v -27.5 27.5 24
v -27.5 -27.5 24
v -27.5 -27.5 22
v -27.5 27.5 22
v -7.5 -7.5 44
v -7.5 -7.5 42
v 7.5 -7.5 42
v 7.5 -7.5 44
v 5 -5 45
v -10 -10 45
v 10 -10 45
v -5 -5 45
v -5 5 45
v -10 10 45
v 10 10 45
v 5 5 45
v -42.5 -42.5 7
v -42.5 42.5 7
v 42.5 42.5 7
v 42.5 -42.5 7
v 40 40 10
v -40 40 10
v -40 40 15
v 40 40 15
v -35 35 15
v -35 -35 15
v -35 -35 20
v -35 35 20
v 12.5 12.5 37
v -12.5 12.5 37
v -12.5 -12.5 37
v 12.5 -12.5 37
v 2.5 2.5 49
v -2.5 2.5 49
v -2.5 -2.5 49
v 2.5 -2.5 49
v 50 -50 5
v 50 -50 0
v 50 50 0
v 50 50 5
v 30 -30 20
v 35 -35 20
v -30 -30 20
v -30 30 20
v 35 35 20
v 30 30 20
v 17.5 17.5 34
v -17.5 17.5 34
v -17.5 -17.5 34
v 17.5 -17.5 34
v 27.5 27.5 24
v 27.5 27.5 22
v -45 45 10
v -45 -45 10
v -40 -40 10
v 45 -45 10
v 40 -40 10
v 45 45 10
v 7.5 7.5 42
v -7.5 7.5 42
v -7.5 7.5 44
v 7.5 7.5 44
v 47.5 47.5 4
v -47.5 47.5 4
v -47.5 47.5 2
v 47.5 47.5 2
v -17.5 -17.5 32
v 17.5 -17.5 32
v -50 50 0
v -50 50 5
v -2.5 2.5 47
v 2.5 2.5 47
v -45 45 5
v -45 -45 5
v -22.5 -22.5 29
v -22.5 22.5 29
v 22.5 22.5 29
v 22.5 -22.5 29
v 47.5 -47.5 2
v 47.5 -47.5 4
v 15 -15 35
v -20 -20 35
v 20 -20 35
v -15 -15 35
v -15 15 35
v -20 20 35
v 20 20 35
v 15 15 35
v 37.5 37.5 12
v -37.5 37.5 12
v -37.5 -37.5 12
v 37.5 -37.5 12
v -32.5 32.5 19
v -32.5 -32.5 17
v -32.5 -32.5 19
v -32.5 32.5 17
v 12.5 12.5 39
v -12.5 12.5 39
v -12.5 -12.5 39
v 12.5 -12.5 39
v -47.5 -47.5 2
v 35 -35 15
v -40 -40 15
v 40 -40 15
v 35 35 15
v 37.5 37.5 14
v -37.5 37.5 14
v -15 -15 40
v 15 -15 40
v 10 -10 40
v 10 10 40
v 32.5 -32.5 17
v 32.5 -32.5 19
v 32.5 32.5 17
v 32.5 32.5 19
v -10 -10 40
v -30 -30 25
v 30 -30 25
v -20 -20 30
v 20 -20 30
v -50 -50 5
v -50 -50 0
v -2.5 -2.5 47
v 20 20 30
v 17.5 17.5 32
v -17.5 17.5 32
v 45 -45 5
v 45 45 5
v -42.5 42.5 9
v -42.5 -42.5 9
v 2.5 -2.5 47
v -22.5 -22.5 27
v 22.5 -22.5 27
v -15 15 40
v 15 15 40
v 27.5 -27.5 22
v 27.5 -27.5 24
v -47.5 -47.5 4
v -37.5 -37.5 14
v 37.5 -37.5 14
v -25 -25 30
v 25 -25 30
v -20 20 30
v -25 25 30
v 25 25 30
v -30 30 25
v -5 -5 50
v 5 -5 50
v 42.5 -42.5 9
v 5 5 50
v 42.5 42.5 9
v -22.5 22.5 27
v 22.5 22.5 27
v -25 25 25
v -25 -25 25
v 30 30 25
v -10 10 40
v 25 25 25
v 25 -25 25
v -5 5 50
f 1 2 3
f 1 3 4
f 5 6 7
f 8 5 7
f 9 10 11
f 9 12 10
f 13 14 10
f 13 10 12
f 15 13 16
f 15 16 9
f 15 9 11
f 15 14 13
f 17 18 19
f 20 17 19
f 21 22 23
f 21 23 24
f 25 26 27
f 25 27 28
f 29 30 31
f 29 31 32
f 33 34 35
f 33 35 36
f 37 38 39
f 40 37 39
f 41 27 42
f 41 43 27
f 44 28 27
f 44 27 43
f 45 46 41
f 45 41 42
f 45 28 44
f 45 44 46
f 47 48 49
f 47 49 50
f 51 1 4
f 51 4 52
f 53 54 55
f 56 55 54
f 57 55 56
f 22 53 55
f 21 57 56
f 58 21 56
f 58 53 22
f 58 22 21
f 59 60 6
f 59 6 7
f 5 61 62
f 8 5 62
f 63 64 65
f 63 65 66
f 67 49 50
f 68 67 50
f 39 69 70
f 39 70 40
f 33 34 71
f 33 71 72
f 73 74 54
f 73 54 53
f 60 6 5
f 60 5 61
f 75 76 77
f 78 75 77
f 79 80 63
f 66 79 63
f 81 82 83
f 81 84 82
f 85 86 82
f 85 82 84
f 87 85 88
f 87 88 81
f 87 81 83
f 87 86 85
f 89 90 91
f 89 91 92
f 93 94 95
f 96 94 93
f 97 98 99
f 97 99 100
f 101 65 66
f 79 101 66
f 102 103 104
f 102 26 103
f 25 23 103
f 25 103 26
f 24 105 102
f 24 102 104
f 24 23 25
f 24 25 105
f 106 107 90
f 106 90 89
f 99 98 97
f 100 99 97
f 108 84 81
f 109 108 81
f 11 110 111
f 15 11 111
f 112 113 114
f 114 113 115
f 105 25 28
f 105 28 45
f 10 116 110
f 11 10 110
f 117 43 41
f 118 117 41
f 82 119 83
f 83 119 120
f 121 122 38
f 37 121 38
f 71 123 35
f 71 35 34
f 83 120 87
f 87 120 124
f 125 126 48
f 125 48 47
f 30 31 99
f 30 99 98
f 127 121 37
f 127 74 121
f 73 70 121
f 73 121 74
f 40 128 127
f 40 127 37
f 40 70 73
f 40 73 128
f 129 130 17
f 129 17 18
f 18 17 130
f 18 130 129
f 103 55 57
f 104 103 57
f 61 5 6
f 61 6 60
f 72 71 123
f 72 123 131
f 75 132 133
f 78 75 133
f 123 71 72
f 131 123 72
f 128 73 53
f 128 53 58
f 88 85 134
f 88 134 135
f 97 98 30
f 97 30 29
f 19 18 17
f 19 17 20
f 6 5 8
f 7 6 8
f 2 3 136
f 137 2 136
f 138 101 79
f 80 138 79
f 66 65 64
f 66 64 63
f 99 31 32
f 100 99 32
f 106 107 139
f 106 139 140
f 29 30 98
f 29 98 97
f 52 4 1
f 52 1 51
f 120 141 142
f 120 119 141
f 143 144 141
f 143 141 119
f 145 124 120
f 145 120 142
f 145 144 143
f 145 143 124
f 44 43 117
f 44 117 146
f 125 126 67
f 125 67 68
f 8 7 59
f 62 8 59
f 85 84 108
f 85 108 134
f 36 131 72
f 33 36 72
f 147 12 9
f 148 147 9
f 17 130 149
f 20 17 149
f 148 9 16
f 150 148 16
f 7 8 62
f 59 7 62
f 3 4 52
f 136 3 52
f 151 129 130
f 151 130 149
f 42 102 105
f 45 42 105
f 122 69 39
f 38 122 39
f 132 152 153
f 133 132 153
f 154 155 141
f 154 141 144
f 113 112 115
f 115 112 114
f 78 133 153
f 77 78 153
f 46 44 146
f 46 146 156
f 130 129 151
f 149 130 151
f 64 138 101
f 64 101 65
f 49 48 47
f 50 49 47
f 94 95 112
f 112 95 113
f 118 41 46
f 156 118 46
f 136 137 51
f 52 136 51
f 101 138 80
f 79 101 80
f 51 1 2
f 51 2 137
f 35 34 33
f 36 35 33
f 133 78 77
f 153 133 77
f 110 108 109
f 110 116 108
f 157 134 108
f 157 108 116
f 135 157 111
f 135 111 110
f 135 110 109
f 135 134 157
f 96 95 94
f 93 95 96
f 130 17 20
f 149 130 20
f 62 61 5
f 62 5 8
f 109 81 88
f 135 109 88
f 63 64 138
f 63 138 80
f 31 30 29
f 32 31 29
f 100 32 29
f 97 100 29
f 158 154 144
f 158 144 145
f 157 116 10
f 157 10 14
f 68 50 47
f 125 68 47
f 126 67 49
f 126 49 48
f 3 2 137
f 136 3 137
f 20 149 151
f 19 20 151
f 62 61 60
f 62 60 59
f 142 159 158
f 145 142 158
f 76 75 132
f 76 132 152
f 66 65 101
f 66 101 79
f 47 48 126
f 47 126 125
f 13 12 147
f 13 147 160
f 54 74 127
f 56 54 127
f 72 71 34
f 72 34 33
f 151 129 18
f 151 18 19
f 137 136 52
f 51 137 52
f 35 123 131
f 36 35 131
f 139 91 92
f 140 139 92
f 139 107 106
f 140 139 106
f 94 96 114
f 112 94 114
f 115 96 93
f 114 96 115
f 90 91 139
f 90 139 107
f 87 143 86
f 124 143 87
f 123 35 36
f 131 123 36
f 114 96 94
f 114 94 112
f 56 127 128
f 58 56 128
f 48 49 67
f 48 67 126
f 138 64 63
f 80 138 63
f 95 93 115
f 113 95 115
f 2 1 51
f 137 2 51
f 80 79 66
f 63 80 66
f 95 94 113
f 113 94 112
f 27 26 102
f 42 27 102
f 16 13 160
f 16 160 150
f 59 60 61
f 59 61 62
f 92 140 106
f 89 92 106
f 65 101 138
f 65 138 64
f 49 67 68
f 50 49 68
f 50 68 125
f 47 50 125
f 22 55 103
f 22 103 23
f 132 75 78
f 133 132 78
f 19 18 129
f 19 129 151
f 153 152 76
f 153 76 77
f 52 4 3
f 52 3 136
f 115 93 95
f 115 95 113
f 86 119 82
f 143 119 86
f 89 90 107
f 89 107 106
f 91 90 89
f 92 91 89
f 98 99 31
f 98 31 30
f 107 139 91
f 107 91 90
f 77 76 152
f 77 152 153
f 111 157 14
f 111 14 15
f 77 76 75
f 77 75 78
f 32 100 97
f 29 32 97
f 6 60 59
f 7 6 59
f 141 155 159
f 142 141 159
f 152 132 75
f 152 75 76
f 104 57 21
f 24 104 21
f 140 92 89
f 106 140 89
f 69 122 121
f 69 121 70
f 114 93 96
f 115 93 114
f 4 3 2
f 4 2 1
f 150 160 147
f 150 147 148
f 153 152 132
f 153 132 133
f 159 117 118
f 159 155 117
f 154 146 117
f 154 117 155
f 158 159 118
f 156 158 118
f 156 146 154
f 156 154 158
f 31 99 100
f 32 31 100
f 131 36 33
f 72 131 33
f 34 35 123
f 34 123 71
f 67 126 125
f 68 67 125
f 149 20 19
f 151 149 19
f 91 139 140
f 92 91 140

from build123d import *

# Parameters (mm, degrees)
F0_W      = 100
F0_H      = 100
F1_DEPTH  = 5
F2_W      = 95
F2_H      = 95
F3_DEPTH  = 3
F4_W      = 95
F4_H      = 95
F5_DEPTH  = 2
F6_W      = 95
F6_H      = 95
F7_DEPTH  = 1
F8_W      = 90
F8_H      = 90
F9_DEPTH  = 5
F10_W     = 85
F10_H     = 85
F11_DEPTH = 3
F12_W     = 85
F12_H     = 85
F13_DEPTH = 2
F14_W     = 85
F14_H     = 85
F15_DEPTH = 1
F16_W     = 80
F16_H     = 80
F17_DEPTH = 5
F18_W     = 75
F18_H     = 75
F19_DEPTH = 3
F20_W     = 75
F20_H     = 75
F21_DEPTH = 2
F22_W     = 75
F22_H     = 75
F23_DEPTH = 1
F24_W     = 70
F24_H     = 70
F25_DEPTH = 5
F26_W     = 65
F26_H     = 65
F27_DEPTH = 3
F28_W     = 65
F28_H     = 65
F29_DEPTH = 2
F30_W     = 65
F30_H     = 65
F31_DEPTH = 1
F32_W     = 60
F32_H     = 60
F33_DEPTH = 5
F34_W     = 55
F34_H     = 55
F35_DEPTH = 3
F36_W     = 55
F36_H     = 55
F37_DEPTH = 2
F38_W     = 55
F38_H     = 55
F39_DEPTH = 1
F40_W     = 50
F40_H     = 50
F41_DEPTH = 5
F42_W     = 45
F42_H     = 45
F43_DEPTH = 3
F44_W     = 45
F44_H     = 45
F45_DEPTH = 2
F46_W     = 45
F46_H     = 45
F47_DEPTH = 1
F48_W     = 40
F48_H     = 40
F49_DEPTH = 5
F50_W     = 35
F50_H     = 35
F51_DEPTH = 3
F52_W     = 35
F52_H     = 35
F53_DEPTH = 2
F54_W     = 35
F54_H     = 35
F55_DEPTH = 1
F56_W     = 30
F56_H     = 30
F57_DEPTH = 5
F58_W     = 25
F58_H     = 25
F59_DEPTH = 3
F60_W     = 25
F60_H     = 25
F61_DEPTH = 2
F62_W     = 25
F62_H     = 25
F63_DEPTH = 1
F64_W     = 20
F64_H     = 20
F65_DEPTH = 5
F66_W     = 15
F66_H     = 15
F67_DEPTH = 3
F68_W     = 15
F68_H     = 15
F69_DEPTH = 2
F70_W     = 15
F70_H     = 15
F71_DEPTH = 1
F72_W     = 10
F72_H     = 10
F73_DEPTH = 5
F74_W     = 5
F74_H     = 5
F75_DEPTH = 3
F76_W     = 5
F76_H     = 5
F77_DEPTH = 2
F78_W     = 5
F78_H     = 5
F79_DEPTH = 1


with BuildPart() as f1:
    # F0 (on Top) → F1 (new body)
    with BuildSketch(Plane.XY):
        Rectangle(F0_W, F0_H)
    extrude(amount=F1_DEPTH)

    # F2 (on face) → F3 (cut)
    with BuildSketch(Plane.XY.offset(5)):
        Rectangle(F2_W, F2_H)
    extrude(amount=-F3_DEPTH, mode=Mode.SUBTRACT)

    # F6 (on face) → F7 (join)
    with BuildSketch(Plane.XY.offset(4)):
        Rectangle(F6_W, F6_H)
    extrude(amount=F7_DEPTH)

    # F8 (on face) → F9 (join)
    with BuildSketch(Plane.XY.offset(5)):
        Rectangle(F8_W, F8_H)
    extrude(amount=F9_DEPTH)

    # F10 (on face) → F11 (cut)
    with BuildSketch(Plane.XY.offset(10)):
        Rectangle(F10_W, F10_H)
    extrude(amount=-F11_DEPTH, mode=Mode.SUBTRACT)

    # F14 (on face) → F15 (join)
    with BuildSketch(Plane.XY.offset(9)):
        Rectangle(F14_W, F14_H)
    extrude(amount=F15_DEPTH)

    # F16 (on face) → F17 (join)
    with BuildSketch(Plane.XY.offset(10)):
        Rectangle(F16_W, F16_H)
    extrude(amount=F17_DEPTH)

    # F18 (on face) → F19 (cut)
    with BuildSketch(Plane.XY.offset(15)):
        Rectangle(F18_W, F18_H)
    extrude(amount=-F19_DEPTH, mode=Mode.SUBTRACT)

    # F22 (on face) → F23 (join)
    with BuildSketch(Plane.XY.offset(14)):
        Rectangle(F22_W, F22_H)
    extrude(amount=F23_DEPTH)

    # F24 (on face) → F25 (join)
    with BuildSketch(Plane.XY.offset(15)):
        Rectangle(F24_W, F24_H)
    extrude(amount=F25_DEPTH)

    # F26 (on face) → F27 (cut)
    with BuildSketch(Plane.XY.offset(20)):
        Rectangle(F26_W, F26_H)
    extrude(amount=-F27_DEPTH, mode=Mode.SUBTRACT)

    # F30 (on face) → F31 (join)
    with BuildSketch(Plane.XY.offset(19)):
        Rectangle(F30_W, F30_H)
    extrude(amount=F31_DEPTH)

    # F32 (on face) → F33 (join)
    with BuildSketch(Plane.XY.offset(20)):
        Rectangle(F32_W, F32_H)
    extrude(amount=F33_DEPTH)

    # F34 (on face) → F35 (cut)
    with BuildSketch(Plane.XY.offset(25)):
        Rectangle(F34_W, F34_H)
    extrude(amount=-F35_DEPTH, mode=Mode.SUBTRACT)

    # F38 (on face) → F39 (join)
    with BuildSketch(Plane.XY.offset(24)):
        Rectangle(F38_W, F38_H)
    extrude(amount=F39_DEPTH)

    # F40 (on face) → F41 (join)
    with BuildSketch(Plane.XY.offset(25)):
        Rectangle(F40_W, F40_H)
    extrude(amount=F41_DEPTH)

    # F42 (on face) → F43 (cut)
    with BuildSketch(Plane.XY.offset(30)):
        Rectangle(F42_W, F42_H)
    extrude(amount=-F43_DEPTH, mode=Mode.SUBTRACT)

    # F46 (on face) → F47 (join)
    with BuildSketch(Plane.XY.offset(29)):
        Rectangle(F46_W, F46_H)
    extrude(amount=F47_DEPTH)

    # F48 (on face) → F49 (join)
    with BuildSketch(Plane.XY.offset(30)):
        Rectangle(F48_W, F48_H)
    extrude(amount=F49_DEPTH)

    # F50 (on face) → F51 (cut)
    with BuildSketch(Plane.XY.offset(35)):
        Rectangle(F50_W, F50_H)
    extrude(amount=-F51_DEPTH, mode=Mode.SUBTRACT)

    # F54 (on face) → F55 (join)
    with BuildSketch(Plane.XY.offset(34)):
        Rectangle(F54_W, F54_H)
    extrude(amount=F55_DEPTH)

    # F56 (on face) → F57 (join)
    with BuildSketch(Plane.XY.offset(35)):
        Rectangle(F56_W, F56_H)
    extrude(amount=F57_DEPTH)

    # F58 (on face) → F59 (cut)
    with BuildSketch(Plane.XY.offset(40)):
        Rectangle(F58_W, F58_H)
    extrude(amount=-F59_DEPTH, mode=Mode.SUBTRACT)

    # F62 (on face) → F63 (join)
    with BuildSketch(Plane.XY.offset(39)):
        Rectangle(F62_W, F62_H)
    extrude(amount=F63_DEPTH)

    # F64 (on face) → F65 (join)
    with BuildSketch(Plane.XY.offset(40)):
        Rectangle(F64_W, F64_H)
    extrude(amount=F65_DEPTH)

    # F66 (on face) → F67 (cut)
    with BuildSketch(Plane.XY.offset(45)):
        Rectangle(F66_W, F66_H)
    extrude(amount=-F67_DEPTH, mode=Mode.SUBTRACT)

    # F70 (on face) → F71 (join)
    with BuildSketch(Plane.XY.offset(44)):
        Rectangle(F70_W, F70_H)
    extrude(amount=F71_DEPTH)

    # F72 (on face) → F73 (join)
    with BuildSketch(Plane.XY.offset(45)):
        Rectangle(F72_W, F72_H)
    extrude(amount=F73_DEPTH)

    # F74 (on face) → F75 (cut)
    with BuildSketch(Plane.XY.offset(50)):
        Rectangle(F74_W, F74_H)
    extrude(amount=-F75_DEPTH, mode=Mode.SUBTRACT)

    # F78 (on face) → F79 (join)
    with BuildSketch(Plane.XY.offset(49)):
        Rectangle(F78_W, F78_H)
    extrude(amount=F79_DEPTH)


with BuildPart() as f5:
    # F4 (on face) → F5 (new body)
    with BuildSketch(Plane.XY.offset(2)):
        Rectangle(F4_W, F4_H)
    extrude(amount=F5_DEPTH)


with BuildPart() as f13:
    # F12 (on face) → F13 (new body)
    with BuildSketch(Plane.XY.offset(7)):
        Rectangle(F12_W, F12_H)
    extrude(amount=F13_DEPTH)


with BuildPart() as f21:
    # F20 (on face) → F21 (new body)
    with BuildSketch(Plane.XY.offset(12)):
        Rectangle(F20_W, F20_H)
    extrude(amount=F21_DEPTH)


with BuildPart() as f29:
    # F28 (on face) → F29 (new body)
    with BuildSketch(Plane.XY.offset(17)):
        Rectangle(F28_W, F28_H)
    extrude(amount=F29_DEPTH)


with BuildPart() as f37:
    # F36 (on face) → F37 (new body)
    with BuildSketch(Plane.XY.offset(22)):
        Rectangle(F36_W, F36_H)
    extrude(amount=F37_DEPTH)


with BuildPart() as f45:
    # F44 (on face) → F45 (new body)
    with BuildSketch(Plane.XY.offset(27)):
        Rectangle(F44_W, F44_H)
    extrude(amount=F45_DEPTH)


with BuildPart() as f53:
    # F52 (on face) → F53 (new body)
    with BuildSketch(Plane.XY.offset(32)):
        Rectangle(F52_W, F52_H)
    extrude(amount=F53_DEPTH)


with BuildPart() as f61:
    # F60 (on face) → F61 (new body)
    with BuildSketch(Plane.XY.offset(37)):
        Rectangle(F60_W, F60_H)
    extrude(amount=F61_DEPTH)


with BuildPart() as f69:
    # F68 (on face) → F69 (new body)
    with BuildSketch(Plane.XY.offset(42)):
        Rectangle(F68_W, F68_H)
    extrude(amount=F69_DEPTH)


with BuildPart() as f77:
    # F76 (on face) → F77 (new body)
    with BuildSketch(Plane.XY.offset(47)):
        Rectangle(F76_W, F76_H)
    extrude(amount=F77_DEPTH)


solid = Compound([f1.part, f5.part, f13.part, f21.part, f29.part, f37.part, f45.part, f53.part, f61.part, f69.part, f77.part])
